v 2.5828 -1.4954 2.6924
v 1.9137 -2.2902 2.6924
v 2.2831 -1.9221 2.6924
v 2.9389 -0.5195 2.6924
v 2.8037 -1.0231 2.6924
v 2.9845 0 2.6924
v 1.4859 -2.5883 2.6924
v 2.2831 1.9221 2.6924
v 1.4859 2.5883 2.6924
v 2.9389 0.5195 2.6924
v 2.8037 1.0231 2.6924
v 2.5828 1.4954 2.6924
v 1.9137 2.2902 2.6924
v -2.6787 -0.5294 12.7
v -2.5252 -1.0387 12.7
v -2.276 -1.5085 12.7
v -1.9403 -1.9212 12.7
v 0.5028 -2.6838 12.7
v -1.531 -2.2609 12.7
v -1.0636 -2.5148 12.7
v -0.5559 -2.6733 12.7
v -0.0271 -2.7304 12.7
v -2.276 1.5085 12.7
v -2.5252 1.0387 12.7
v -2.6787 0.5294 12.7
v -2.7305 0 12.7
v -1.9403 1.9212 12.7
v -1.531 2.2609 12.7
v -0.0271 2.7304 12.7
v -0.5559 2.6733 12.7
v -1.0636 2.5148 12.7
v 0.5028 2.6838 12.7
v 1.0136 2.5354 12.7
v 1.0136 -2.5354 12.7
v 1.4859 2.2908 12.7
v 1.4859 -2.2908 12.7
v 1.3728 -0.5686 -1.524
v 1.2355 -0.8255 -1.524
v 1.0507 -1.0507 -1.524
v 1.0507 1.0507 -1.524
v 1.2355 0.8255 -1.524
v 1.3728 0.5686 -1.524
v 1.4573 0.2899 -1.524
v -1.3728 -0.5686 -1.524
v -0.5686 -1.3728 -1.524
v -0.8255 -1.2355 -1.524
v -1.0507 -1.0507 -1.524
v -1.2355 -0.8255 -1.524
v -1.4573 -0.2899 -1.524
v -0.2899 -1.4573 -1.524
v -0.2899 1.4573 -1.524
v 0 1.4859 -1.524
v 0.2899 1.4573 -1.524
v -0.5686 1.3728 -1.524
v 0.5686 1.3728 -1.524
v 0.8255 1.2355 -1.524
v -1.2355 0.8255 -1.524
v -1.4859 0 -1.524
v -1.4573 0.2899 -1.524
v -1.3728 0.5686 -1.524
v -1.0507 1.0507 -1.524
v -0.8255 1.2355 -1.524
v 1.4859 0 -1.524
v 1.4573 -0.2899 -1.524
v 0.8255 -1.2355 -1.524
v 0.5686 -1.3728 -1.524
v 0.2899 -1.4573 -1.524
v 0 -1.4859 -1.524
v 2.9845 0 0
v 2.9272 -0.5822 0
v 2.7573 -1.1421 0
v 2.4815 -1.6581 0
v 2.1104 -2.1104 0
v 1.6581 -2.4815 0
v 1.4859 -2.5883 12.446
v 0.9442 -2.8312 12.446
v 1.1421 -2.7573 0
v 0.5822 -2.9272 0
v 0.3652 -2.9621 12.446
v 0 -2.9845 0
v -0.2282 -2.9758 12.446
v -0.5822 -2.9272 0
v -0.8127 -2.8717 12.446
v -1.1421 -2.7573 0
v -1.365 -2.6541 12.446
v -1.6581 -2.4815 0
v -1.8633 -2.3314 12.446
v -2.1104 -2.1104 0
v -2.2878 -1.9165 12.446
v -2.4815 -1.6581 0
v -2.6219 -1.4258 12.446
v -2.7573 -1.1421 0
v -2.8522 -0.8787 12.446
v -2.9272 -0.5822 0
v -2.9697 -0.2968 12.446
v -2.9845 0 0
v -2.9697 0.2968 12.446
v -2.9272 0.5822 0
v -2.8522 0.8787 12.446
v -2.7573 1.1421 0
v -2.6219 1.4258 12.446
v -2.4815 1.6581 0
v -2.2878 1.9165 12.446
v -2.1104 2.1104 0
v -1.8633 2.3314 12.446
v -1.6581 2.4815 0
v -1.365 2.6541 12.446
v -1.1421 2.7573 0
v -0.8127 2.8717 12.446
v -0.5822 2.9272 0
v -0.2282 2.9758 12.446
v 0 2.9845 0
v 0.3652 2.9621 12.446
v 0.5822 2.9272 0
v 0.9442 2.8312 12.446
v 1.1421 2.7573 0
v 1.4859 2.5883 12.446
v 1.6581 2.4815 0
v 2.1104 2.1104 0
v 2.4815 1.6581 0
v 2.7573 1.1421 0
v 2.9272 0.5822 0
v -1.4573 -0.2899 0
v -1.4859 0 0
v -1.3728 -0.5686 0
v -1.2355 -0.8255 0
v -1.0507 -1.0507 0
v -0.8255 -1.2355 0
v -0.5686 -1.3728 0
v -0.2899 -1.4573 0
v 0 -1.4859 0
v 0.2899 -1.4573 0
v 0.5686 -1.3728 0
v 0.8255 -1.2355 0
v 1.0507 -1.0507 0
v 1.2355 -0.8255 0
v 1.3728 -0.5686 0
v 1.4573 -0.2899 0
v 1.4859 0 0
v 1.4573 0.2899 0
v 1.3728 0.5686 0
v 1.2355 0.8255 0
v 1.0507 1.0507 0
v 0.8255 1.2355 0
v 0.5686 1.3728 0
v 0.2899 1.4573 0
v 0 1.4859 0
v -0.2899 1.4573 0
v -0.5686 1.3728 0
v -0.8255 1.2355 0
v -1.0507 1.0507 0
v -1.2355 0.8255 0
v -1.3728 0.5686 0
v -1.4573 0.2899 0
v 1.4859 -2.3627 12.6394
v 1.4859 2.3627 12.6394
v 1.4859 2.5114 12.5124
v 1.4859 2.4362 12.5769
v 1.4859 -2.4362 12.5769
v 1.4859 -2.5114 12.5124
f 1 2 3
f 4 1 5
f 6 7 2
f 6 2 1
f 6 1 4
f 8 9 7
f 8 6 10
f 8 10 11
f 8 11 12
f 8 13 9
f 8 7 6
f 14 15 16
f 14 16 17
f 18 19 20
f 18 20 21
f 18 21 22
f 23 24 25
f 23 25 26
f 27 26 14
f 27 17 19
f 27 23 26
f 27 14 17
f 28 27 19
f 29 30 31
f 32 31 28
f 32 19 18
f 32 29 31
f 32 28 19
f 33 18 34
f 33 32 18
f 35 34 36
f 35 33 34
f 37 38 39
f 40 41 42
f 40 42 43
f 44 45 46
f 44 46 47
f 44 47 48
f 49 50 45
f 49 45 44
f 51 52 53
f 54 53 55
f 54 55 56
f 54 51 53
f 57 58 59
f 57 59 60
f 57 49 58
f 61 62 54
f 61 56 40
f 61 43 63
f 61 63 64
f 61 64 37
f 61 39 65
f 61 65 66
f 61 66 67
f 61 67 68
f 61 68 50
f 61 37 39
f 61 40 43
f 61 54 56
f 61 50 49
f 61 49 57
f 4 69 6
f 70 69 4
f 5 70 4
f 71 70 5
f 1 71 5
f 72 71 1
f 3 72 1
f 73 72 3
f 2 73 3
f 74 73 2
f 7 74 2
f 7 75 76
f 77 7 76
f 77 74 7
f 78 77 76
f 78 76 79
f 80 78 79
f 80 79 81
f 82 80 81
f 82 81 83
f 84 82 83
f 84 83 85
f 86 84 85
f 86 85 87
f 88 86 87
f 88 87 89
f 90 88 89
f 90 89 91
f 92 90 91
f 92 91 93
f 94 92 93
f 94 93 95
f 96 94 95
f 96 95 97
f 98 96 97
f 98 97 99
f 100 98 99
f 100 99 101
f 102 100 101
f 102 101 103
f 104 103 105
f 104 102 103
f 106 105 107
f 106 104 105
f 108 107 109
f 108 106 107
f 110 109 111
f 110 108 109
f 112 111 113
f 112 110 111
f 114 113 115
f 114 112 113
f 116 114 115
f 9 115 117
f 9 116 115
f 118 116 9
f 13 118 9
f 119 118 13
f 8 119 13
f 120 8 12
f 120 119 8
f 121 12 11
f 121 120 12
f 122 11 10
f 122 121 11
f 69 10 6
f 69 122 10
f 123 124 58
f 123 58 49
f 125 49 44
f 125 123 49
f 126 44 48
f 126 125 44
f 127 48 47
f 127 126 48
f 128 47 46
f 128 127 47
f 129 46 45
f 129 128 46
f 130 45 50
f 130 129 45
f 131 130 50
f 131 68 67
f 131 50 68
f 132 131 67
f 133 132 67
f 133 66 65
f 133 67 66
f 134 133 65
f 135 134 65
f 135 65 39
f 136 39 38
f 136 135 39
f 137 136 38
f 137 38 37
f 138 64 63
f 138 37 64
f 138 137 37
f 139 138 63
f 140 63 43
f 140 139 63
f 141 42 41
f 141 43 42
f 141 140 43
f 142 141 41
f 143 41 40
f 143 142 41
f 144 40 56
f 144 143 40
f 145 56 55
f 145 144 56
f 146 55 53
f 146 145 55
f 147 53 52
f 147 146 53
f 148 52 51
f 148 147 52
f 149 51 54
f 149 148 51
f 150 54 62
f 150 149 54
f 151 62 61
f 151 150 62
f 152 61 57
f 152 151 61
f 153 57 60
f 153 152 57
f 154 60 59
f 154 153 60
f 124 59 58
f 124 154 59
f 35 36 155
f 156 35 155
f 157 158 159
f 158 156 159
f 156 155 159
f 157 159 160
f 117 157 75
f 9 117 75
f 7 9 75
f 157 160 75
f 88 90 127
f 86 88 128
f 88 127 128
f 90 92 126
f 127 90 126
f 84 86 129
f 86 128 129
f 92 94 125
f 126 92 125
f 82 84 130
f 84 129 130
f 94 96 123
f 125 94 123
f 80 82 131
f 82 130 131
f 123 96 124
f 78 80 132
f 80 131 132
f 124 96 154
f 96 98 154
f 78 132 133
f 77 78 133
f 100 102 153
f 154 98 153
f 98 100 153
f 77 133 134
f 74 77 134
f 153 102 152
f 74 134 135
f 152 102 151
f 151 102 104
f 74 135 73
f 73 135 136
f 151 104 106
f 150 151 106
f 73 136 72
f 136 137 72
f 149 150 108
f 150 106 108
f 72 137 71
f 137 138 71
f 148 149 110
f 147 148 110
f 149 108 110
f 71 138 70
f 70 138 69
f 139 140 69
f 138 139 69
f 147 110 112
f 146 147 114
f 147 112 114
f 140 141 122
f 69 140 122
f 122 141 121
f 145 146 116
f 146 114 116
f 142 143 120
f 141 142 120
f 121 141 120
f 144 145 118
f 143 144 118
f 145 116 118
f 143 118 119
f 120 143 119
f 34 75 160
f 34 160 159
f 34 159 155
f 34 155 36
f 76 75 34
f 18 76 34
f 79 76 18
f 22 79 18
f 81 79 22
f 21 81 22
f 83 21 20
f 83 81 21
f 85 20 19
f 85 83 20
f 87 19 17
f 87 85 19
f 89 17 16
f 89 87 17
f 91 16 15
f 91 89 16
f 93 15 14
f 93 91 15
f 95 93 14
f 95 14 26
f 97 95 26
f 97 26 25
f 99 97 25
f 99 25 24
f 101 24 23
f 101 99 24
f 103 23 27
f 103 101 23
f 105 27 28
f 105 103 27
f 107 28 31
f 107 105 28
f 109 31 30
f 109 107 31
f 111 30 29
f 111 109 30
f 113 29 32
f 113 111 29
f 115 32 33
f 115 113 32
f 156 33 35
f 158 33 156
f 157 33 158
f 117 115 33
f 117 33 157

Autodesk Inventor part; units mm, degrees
ref_plane "YZ Plane" through (0, 0, 0) normal (1, 0, 0) x (0, 1, 0)
ref_plane "XZ Plane" through (0, 0, 0) normal (0, 1, 0) x (-1, 0, 0)
ref_plane "XY Plane" through (0, 0, 0) normal (0, 0, 1) x (1, 0, 0)
sketch "Sketch1" plane through (0, 0, 0) normal (0, 0, 1) x (1, 0, 0)
  circle A0 centre (0, 0) radius 2.9845
  dimension "d0" = 5.969
extrude "Extrusion1" add sketch "Sketch1" along normal blind 12.7
sketch "Sketch2" plane through (0, 0, 12.7) normal (0, 0, 1) x (1, 0, 0)
  circle A0 centre (0, 0) radius 2.9845 projected
  circle A1 centre (0, 0) radius 2.9845 projected
  line L0 (1.4859, 2.5883) -> (1.4859, -2.5883)
  dimension "d3" = 1.4859
extrude "Extrusion2" cut sketch "Sketch2" against normal blind 10.0076 contours A0 L0 picked at (1.9854, 0)
sketch "Sketch3" plane through (0, 0, 0) normal (0, 0, -1) x (-1, 0, 0)
  circle A0 centre (0, 0) radius 2.9845 projected
  circle A1 centre (0, 0) radius 1.4859
extrude "Extrusion3" add sketch "Sketch3" along normal blind 1.524 contours A1
chamfer "Chamfer1" distance 0.254 angle 45 1 edges at (-2.9845, 0, 12.7)
properties part number "shaft_encoder"
